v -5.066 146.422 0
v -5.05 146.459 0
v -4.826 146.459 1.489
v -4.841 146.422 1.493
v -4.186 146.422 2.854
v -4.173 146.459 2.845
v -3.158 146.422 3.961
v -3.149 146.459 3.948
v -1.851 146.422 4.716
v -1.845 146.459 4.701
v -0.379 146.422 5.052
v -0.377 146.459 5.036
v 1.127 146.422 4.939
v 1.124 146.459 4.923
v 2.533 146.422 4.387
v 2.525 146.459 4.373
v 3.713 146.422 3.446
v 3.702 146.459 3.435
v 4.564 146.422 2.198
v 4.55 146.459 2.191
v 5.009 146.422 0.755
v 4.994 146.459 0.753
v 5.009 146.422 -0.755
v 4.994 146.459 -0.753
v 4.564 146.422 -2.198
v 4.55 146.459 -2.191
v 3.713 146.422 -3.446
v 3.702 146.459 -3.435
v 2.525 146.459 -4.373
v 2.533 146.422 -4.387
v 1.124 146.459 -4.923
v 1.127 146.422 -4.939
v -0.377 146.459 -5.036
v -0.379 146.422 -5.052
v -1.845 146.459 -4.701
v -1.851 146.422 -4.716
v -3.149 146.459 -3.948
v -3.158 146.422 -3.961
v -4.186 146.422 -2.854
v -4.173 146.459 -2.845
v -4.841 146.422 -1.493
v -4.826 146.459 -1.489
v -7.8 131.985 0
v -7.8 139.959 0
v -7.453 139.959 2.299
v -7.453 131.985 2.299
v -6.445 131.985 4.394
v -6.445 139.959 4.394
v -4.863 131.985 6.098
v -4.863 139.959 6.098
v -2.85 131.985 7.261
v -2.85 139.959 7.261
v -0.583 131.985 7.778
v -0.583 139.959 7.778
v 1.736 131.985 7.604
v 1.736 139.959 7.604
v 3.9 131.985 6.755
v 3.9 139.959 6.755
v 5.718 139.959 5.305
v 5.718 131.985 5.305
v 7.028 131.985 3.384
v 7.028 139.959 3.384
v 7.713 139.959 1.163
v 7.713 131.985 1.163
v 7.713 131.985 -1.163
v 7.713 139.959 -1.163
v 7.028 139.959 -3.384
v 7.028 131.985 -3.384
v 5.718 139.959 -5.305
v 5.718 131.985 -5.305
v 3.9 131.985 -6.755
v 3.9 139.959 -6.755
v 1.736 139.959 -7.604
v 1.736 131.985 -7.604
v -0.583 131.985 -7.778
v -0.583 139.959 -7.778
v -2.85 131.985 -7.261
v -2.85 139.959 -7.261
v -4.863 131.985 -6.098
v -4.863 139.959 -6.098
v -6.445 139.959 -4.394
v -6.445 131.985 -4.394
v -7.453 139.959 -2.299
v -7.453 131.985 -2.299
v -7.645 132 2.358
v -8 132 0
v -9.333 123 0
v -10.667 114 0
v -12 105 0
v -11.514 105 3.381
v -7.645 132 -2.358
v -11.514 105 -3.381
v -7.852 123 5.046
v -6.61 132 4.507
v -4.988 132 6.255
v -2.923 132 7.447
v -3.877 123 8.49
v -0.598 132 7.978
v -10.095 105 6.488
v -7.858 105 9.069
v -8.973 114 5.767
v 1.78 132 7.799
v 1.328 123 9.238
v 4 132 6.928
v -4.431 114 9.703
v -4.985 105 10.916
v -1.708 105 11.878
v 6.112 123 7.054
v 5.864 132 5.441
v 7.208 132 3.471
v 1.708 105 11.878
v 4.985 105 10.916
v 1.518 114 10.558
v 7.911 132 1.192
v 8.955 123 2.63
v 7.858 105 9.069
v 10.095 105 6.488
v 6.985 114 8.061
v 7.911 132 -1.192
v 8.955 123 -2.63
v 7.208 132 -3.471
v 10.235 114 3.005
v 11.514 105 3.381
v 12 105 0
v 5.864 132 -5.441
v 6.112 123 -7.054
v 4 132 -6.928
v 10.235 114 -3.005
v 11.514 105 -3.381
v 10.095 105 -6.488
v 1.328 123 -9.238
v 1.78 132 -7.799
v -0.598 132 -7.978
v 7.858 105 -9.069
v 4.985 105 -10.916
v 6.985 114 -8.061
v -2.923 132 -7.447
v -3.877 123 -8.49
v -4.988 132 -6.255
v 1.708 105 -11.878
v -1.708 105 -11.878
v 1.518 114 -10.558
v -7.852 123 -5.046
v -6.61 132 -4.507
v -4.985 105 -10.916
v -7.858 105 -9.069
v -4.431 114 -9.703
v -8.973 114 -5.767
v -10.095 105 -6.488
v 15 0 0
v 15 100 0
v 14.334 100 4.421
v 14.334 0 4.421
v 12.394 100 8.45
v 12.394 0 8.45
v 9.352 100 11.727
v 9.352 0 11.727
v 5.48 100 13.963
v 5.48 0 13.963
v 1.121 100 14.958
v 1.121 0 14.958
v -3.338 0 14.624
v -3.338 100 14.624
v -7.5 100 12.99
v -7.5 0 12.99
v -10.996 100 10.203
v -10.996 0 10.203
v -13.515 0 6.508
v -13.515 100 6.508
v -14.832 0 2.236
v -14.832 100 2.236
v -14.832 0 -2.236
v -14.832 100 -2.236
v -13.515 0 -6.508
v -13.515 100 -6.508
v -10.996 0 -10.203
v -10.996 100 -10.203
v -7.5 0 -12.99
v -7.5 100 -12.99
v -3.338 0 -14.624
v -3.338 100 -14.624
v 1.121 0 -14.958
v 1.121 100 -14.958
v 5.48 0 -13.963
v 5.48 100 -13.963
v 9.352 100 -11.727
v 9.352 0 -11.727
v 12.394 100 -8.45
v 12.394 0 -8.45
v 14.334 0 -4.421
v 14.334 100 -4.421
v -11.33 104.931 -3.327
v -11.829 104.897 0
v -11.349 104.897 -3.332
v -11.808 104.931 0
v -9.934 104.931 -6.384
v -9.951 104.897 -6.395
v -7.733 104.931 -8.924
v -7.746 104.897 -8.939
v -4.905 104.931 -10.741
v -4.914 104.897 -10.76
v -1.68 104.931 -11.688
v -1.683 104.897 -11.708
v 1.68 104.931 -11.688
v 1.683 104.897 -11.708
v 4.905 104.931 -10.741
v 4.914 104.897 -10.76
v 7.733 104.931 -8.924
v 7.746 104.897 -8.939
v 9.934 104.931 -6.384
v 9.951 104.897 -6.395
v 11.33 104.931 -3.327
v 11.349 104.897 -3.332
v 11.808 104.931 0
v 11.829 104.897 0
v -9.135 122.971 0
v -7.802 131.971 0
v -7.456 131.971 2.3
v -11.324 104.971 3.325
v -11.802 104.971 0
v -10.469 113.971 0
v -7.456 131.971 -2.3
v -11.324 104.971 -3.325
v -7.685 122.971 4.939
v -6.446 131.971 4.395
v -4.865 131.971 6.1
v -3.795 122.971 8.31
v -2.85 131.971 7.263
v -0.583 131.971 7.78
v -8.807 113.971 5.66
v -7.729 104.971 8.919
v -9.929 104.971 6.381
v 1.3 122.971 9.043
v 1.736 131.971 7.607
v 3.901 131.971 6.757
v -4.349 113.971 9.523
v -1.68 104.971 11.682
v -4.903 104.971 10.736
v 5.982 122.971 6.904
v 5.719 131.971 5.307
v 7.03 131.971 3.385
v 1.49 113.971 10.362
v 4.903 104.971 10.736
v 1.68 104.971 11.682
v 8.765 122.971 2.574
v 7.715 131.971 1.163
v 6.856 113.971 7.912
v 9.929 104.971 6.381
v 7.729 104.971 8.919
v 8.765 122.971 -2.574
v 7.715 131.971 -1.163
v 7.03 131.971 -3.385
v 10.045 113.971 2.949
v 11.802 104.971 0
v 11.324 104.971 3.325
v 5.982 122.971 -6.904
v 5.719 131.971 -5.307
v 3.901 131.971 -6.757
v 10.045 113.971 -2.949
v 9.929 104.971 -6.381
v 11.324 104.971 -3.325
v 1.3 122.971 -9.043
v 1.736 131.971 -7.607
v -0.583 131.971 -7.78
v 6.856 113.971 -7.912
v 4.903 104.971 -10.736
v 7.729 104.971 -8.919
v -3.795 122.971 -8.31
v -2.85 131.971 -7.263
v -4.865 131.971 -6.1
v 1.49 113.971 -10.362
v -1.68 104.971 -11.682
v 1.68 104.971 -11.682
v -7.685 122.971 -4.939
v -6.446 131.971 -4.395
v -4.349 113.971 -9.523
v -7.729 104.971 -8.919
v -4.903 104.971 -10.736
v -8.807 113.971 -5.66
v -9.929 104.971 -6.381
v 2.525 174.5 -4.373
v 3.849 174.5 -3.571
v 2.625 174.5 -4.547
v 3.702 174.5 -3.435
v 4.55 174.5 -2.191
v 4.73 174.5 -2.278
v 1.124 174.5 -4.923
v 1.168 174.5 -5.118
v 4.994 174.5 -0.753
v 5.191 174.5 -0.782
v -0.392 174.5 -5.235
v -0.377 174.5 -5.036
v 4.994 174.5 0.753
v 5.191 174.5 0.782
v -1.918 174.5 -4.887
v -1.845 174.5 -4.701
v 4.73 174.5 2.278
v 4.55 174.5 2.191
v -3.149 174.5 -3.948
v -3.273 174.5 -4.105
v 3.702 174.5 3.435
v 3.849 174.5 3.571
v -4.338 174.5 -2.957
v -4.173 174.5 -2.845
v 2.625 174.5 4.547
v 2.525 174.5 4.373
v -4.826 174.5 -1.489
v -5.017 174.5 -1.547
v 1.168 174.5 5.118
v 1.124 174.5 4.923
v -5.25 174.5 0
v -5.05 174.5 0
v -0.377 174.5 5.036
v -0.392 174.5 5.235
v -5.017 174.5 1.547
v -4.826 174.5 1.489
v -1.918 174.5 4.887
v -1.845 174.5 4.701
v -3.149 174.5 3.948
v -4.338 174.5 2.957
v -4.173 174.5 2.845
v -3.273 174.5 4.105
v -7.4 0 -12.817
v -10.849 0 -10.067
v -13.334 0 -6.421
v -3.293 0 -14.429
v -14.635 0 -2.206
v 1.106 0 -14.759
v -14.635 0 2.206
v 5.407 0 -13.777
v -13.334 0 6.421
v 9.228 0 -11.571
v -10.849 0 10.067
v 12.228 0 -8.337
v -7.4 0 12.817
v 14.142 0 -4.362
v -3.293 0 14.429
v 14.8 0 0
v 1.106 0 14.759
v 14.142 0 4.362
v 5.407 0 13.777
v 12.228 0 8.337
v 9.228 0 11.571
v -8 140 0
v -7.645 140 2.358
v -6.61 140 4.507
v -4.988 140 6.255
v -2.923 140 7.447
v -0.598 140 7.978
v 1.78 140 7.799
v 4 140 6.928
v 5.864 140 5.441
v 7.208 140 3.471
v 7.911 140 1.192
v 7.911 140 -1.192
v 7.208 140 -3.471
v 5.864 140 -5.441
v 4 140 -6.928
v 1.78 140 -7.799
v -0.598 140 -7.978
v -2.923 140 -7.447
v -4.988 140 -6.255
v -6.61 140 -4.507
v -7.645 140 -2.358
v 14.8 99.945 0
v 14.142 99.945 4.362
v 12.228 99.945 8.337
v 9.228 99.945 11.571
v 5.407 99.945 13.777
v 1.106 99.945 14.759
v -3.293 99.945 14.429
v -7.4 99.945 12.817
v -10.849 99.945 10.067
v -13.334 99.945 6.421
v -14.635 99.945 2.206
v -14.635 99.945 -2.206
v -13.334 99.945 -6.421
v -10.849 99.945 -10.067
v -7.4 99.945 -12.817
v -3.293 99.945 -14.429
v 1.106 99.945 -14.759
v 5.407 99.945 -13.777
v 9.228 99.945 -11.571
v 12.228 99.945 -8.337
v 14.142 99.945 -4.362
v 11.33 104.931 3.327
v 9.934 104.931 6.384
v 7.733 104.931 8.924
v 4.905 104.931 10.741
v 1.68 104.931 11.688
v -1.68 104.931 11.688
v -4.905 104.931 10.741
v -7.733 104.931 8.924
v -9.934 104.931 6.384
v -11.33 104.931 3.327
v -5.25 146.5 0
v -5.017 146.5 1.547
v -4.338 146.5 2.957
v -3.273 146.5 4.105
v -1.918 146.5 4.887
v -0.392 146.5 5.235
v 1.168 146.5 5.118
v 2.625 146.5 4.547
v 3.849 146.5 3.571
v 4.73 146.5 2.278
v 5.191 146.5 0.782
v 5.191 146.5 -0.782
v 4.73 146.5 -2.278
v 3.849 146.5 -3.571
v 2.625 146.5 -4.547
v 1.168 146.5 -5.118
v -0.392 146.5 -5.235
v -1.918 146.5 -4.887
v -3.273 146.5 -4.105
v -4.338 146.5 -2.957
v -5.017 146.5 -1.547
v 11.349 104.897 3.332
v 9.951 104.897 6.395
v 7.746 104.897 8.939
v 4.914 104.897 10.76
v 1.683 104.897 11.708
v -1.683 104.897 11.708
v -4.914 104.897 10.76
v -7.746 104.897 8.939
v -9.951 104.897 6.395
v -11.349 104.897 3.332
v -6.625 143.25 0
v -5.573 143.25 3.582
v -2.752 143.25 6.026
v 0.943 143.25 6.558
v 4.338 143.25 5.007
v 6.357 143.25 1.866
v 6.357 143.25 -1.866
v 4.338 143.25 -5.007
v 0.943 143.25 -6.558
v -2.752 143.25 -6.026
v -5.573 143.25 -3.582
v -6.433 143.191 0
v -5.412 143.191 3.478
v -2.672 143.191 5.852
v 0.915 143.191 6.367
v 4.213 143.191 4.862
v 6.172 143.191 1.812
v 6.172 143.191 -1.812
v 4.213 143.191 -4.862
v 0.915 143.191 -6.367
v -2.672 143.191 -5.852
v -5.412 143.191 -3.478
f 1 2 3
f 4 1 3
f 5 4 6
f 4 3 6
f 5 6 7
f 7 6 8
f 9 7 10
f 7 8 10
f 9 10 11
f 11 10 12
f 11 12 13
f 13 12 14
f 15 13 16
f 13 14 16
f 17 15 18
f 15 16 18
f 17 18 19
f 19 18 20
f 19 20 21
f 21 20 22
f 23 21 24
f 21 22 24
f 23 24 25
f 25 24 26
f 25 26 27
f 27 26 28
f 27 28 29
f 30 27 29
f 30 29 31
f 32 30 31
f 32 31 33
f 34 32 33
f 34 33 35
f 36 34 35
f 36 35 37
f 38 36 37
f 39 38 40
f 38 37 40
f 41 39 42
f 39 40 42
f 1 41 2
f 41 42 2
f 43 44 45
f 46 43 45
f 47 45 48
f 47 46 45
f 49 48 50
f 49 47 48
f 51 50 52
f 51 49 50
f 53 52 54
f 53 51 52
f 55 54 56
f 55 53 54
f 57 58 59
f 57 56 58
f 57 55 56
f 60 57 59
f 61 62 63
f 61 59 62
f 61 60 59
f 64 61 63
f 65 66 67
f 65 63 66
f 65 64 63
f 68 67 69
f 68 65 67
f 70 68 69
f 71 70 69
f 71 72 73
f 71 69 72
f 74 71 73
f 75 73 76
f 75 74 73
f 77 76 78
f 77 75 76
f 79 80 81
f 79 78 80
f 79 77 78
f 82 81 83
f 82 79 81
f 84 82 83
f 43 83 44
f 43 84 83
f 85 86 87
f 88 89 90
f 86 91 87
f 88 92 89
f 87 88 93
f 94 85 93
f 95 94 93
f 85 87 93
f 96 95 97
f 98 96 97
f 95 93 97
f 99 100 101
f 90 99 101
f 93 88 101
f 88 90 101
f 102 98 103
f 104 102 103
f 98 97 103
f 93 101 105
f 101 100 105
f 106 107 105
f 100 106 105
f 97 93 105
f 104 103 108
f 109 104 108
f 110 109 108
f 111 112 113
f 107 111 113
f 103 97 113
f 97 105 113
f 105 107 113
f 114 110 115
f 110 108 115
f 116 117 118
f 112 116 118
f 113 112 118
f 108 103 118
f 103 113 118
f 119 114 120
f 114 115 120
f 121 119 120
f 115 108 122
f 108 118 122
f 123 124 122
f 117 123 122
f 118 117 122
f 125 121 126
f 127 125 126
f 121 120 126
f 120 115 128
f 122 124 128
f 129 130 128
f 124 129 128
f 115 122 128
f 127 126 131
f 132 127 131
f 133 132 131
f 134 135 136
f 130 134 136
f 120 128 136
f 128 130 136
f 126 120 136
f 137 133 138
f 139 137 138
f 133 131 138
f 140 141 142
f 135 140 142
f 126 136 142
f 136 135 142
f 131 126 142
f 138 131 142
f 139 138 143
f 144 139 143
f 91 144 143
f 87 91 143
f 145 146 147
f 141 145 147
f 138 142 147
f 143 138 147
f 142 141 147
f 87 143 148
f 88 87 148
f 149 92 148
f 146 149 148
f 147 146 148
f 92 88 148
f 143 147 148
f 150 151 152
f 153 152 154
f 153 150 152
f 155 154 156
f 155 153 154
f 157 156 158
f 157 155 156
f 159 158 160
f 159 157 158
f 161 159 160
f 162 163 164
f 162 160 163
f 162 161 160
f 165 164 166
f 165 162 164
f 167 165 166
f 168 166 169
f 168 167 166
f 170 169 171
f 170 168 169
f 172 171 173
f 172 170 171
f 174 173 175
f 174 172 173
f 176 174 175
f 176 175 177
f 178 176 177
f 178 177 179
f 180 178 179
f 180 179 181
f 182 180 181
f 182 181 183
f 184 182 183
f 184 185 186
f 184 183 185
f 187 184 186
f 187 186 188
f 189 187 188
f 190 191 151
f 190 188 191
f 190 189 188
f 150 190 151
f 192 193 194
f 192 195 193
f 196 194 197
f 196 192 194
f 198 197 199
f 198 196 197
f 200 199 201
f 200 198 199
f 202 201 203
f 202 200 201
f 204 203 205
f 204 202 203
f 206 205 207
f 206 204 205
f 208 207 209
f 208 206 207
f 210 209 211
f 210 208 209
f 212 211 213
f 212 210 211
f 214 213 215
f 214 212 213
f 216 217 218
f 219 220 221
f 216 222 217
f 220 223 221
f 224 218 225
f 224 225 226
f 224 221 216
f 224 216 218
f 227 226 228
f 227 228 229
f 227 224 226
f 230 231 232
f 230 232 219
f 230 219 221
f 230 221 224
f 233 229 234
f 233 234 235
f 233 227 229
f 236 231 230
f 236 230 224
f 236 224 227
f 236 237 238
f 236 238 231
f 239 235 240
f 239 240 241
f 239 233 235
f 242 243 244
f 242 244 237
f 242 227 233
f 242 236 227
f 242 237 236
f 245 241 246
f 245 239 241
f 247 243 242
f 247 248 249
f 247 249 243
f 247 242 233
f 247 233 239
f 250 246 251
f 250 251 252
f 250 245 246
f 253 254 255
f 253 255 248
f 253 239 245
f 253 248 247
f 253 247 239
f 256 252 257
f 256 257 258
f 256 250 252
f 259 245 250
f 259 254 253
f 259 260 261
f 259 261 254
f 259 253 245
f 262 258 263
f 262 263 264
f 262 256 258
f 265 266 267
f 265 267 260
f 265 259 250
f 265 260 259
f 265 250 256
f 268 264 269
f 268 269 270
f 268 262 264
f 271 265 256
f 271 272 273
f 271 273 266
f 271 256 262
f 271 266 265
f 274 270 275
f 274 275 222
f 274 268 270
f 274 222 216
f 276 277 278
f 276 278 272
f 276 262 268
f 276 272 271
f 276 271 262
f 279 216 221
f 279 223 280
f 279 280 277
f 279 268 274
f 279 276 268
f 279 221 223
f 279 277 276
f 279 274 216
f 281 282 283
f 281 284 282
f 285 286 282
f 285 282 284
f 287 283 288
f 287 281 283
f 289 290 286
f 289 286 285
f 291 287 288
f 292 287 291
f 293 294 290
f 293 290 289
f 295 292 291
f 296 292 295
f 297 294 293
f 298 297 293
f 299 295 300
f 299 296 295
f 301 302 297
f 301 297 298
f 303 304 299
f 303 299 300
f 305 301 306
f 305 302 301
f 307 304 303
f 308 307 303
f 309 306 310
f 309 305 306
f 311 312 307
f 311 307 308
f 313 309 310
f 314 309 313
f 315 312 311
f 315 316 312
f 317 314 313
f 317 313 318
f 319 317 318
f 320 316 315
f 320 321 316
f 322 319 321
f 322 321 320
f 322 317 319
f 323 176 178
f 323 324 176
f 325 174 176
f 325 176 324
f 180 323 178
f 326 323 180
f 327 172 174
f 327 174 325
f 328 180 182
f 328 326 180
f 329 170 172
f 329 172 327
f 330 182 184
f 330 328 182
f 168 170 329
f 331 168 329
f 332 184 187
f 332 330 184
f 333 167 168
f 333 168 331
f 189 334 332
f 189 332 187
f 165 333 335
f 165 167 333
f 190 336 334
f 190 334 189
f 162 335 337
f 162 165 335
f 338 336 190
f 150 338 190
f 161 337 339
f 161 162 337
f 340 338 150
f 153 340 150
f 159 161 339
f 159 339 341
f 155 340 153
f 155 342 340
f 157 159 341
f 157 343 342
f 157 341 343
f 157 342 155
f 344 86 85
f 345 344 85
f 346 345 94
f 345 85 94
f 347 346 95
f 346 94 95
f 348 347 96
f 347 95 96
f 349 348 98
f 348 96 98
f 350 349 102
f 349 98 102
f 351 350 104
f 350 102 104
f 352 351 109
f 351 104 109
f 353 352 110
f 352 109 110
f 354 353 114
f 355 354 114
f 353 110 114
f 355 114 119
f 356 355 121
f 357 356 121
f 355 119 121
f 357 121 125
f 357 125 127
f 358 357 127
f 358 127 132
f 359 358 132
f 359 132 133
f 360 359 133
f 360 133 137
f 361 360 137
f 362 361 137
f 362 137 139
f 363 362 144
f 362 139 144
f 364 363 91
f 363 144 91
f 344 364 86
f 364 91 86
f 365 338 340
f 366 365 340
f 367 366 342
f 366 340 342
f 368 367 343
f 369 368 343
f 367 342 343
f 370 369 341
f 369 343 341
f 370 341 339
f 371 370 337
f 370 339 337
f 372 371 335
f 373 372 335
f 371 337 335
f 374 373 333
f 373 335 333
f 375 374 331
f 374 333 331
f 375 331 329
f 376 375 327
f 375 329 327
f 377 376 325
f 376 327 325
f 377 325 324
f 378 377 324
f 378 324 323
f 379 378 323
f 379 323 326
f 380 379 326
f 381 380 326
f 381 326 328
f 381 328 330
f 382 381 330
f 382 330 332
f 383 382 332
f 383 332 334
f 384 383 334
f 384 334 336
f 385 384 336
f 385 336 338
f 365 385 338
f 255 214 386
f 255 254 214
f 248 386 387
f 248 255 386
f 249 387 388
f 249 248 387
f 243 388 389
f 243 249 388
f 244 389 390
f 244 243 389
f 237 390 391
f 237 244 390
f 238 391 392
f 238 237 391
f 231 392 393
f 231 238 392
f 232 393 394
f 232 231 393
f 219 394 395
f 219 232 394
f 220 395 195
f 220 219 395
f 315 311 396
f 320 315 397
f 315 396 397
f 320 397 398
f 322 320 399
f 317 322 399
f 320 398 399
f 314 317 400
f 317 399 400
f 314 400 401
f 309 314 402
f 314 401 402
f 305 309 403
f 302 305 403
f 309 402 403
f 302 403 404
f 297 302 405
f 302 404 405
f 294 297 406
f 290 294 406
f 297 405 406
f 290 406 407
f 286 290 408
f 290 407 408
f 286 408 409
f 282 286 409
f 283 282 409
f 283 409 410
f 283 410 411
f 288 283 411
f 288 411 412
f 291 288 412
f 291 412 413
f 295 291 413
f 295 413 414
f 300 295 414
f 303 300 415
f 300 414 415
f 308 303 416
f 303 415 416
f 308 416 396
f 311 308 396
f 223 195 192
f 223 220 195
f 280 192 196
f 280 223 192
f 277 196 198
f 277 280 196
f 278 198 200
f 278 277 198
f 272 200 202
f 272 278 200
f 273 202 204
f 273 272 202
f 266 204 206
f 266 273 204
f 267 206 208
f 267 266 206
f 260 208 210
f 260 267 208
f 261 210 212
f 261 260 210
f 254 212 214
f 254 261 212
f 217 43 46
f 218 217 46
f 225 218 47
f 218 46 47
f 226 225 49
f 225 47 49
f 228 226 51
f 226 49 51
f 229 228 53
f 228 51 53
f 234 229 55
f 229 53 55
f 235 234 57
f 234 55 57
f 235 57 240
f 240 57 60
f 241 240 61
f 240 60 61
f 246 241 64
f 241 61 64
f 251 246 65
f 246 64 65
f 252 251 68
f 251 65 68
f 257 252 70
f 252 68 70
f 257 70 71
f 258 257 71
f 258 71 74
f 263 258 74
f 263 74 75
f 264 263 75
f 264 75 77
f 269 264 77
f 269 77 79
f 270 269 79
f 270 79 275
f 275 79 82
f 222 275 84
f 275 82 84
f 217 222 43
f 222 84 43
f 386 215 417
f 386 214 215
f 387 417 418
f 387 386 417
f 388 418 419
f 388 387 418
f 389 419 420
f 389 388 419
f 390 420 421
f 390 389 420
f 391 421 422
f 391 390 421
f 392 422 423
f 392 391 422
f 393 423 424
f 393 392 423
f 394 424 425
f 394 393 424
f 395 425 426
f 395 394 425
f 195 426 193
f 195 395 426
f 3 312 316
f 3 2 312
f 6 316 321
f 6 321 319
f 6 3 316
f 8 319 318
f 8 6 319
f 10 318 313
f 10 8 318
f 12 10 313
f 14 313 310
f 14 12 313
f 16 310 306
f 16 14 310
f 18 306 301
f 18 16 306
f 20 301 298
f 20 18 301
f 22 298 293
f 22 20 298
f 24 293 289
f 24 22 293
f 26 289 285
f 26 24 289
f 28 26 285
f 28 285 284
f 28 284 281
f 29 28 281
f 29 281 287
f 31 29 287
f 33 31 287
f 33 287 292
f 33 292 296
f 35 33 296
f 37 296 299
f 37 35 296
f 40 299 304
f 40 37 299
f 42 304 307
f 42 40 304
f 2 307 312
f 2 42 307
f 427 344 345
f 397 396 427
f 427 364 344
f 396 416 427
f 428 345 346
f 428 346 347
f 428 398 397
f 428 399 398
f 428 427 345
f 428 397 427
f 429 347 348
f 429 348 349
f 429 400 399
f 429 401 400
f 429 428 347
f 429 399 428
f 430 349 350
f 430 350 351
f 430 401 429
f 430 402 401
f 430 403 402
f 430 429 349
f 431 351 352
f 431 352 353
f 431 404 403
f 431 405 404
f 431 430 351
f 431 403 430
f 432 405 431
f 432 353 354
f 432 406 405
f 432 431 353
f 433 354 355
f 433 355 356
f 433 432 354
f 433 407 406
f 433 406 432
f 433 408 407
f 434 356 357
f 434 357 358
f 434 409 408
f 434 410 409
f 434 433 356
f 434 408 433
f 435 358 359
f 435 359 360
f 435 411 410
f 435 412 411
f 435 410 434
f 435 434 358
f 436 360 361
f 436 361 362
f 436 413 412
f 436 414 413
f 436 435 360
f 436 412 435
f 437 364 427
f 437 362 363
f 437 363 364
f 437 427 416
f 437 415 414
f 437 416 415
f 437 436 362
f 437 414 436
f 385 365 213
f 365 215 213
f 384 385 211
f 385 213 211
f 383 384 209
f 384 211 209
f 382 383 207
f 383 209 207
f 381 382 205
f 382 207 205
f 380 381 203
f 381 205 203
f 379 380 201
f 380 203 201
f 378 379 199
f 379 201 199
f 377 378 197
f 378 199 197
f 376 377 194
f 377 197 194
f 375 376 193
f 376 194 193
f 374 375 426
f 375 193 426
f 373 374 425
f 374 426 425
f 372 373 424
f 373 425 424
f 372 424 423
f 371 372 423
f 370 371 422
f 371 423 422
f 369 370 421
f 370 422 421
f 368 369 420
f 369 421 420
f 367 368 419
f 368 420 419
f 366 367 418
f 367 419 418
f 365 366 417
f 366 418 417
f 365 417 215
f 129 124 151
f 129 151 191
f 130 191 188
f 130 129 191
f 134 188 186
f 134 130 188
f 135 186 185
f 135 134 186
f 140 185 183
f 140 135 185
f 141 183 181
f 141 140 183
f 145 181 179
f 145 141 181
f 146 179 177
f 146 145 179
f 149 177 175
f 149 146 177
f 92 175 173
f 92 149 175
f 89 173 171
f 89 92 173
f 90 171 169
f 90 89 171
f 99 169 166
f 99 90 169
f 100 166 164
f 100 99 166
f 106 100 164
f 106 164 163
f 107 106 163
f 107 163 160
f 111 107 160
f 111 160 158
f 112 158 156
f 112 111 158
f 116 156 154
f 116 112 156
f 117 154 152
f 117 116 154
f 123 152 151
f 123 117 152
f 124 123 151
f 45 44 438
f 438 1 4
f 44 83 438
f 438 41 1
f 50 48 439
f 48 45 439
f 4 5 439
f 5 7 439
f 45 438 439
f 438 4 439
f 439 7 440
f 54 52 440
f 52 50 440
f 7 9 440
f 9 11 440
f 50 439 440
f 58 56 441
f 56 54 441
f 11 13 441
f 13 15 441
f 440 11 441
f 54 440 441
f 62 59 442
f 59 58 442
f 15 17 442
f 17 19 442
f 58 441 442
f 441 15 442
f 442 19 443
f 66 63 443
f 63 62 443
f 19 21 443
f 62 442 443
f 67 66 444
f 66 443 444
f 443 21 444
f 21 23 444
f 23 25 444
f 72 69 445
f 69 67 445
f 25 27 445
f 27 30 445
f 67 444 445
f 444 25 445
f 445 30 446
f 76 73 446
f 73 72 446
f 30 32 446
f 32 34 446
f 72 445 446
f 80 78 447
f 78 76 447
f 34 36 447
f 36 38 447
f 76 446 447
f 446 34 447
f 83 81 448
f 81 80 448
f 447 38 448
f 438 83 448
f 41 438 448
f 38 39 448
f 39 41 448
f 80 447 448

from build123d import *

# Parameters (mm, degrees)
F0_R         = 15
F1_DEPTH     = 100
F1_FACE_R    = 15
F3_R         = 12
F6_R         = 8
F4_FACE_R    = 12
F8_DEPTH     = 8
F8_FACE_R    = 8
F10_R        = 5.25
F12_DEPTH    = 28
F13_T        = 0.2
F13_T4_ANGLE = 180.000000001
F13_T6_ANGLE = 180.000000001


# Not quite as in the source:
# - a shell that OpenCascade refuses in one call is made with other operations: the cavity is built on its own and cut out


with BuildPart() as f1:
    # F0 (on Front) → F1 (new body)
    with BuildSketch(Plane.XZ):
        Circle(F0_R)
    extrude(amount=-F1_DEPTH)

    # F1_face (on face) → F4 section 0
    with BuildSketch(Plane(origin=(0, 100, 0), x_dir=(1, 0, 0), z_dir=(0, 1, 0))):
        Circle(F1_FACE_R)
    # F3 (on offset) → F4 section 1
    with BuildSketch(Plane(origin=(0, 105, 0), x_dir=(-1, 0, 0), z_dir=(0, 1, 0))):
        Circle(F3_R)
    loft()

    # F6 (on offset) → F7 section 0
    with BuildSketch(Plane(origin=(0, 132, 0), x_dir=(-1, 0, 0), z_dir=(0, 1, 0))):
        Circle(F6_R)
    # F4_face (on face) → F7 section 1
    with BuildSketch(Plane(origin=(0, 105, 0), x_dir=(-1, 0, 0), z_dir=(0, 1, 0))):
        Circle(F4_FACE_R)
    loft()

    # F8 (add): a face of the model
    f8_faces = [f1.faces().sort_by_distance(p)[0] for p in [
        (0, 132, 0),
    ]]
    extrude(f8_faces, amount=F8_DEPTH)

    # F8_face (on face) → F11 section 0
    with BuildSketch(Plane(origin=(0, 140, 0), x_dir=(-1, 0, 0), z_dir=(0, 1, 0))):
        Circle(F8_FACE_R)
    # F10 (on offset) → F11 section 1
    with BuildSketch(Plane(origin=(0, 146.5, 0), x_dir=(-1, 0, 0), z_dir=(0, 1, 0))):
        Circle(F10_R)
    loft()

    # F12 (add): a face of the model
    f12_faces = [f1.faces().sort_by_distance(p)[0] for p in [
        (0, 146.5, 0),
    ]]
    extrude(f12_faces, amount=F12_DEPTH)

    # F13: shell of thickness 0.2, made by hand


with BuildPart() as f13_core1:
    # F13_t2: copy of F1
    add(f1.part)

    # the walls: a layer under each face that stays
    f13_faces = [f13_core1.faces().sort_by_distance(p)[0] for p in [
        (-15, 50, 0),
        (-13.5, 102.5, 0),
        (10, 118.5, 0),
        (8, 136, 0),
        (6.625, 143.25, 0),
        (5.25, 160.5, 0),
    ]]
    thicken(f13_faces, amount=-F13_T, mode=Mode.SUBTRACT)

    # F13_s3 → F13_t4 (revolve, cut)
    with BuildSketch(Plane.XY):
        Polygon((-12.0036933928, 105.0013220888), (-11.8285014149, 104.8971008489), (-11.807999158, 104.931271277), (-11.8021593075, 104.9706902678), align=None)
    revolve(axis=Axis((0, 105, 0), (0, -1, 0)), revolution_arc=F13_T4_ANGLE, mode=Mode.SUBTRACT)

    # F13_s5 → F13_t6 (revolve, cut)
    with BuildSketch(Plane.XY):
        Polygon((12.0036933928, 105.0013220888), (11.8285014149, 104.8971008489), (11.807999158, 104.931271277), (11.8021593075, 104.9706902678), align=None)
    revolve(axis=Axis((0, 105, 0), (0, -1, 0)), revolution_arc=F13_T6_ANGLE, mode=Mode.SUBTRACT)

    # F13_s7 → F13_t8 (revolve, cut)
    with BuildSketch(Plane.XY):
        Polygon((-8.0039784069, 132.0002930973), (-7.8021593075, 131.9706902678), (-7.8, 131.9852655936), (-7.8, 132), align=None)
    revolve(axis=Axis((0, 132, 0), (0, 1, 0)), mode=Mode.SUBTRACT)

    # F13_s9 → F13_t10 (revolve, cut)
    with BuildSketch(Plane.XY):
        Polygon((-5.2538419345, 146.50077928), (-5.0658065498, 146.4220720018), (-5.05, 146.4594329377), (-5.05, 146.5), align=None)
    revolve(axis=Axis((0, 146.5, 0), (0, 1, 0)), mode=Mode.SUBTRACT)


with BuildPart() as f1_1:
    add(f1.part)

    # what is left inside the walls is the cavity
    f13_cavity = [f13_core1.part.solids().sort_by_distance(p)[0] for p in [
        (-14.798, 66.629735, 0),
    ]]
    add(f13_cavity, mode=Mode.SUBTRACT)


solid = f1_1.part
